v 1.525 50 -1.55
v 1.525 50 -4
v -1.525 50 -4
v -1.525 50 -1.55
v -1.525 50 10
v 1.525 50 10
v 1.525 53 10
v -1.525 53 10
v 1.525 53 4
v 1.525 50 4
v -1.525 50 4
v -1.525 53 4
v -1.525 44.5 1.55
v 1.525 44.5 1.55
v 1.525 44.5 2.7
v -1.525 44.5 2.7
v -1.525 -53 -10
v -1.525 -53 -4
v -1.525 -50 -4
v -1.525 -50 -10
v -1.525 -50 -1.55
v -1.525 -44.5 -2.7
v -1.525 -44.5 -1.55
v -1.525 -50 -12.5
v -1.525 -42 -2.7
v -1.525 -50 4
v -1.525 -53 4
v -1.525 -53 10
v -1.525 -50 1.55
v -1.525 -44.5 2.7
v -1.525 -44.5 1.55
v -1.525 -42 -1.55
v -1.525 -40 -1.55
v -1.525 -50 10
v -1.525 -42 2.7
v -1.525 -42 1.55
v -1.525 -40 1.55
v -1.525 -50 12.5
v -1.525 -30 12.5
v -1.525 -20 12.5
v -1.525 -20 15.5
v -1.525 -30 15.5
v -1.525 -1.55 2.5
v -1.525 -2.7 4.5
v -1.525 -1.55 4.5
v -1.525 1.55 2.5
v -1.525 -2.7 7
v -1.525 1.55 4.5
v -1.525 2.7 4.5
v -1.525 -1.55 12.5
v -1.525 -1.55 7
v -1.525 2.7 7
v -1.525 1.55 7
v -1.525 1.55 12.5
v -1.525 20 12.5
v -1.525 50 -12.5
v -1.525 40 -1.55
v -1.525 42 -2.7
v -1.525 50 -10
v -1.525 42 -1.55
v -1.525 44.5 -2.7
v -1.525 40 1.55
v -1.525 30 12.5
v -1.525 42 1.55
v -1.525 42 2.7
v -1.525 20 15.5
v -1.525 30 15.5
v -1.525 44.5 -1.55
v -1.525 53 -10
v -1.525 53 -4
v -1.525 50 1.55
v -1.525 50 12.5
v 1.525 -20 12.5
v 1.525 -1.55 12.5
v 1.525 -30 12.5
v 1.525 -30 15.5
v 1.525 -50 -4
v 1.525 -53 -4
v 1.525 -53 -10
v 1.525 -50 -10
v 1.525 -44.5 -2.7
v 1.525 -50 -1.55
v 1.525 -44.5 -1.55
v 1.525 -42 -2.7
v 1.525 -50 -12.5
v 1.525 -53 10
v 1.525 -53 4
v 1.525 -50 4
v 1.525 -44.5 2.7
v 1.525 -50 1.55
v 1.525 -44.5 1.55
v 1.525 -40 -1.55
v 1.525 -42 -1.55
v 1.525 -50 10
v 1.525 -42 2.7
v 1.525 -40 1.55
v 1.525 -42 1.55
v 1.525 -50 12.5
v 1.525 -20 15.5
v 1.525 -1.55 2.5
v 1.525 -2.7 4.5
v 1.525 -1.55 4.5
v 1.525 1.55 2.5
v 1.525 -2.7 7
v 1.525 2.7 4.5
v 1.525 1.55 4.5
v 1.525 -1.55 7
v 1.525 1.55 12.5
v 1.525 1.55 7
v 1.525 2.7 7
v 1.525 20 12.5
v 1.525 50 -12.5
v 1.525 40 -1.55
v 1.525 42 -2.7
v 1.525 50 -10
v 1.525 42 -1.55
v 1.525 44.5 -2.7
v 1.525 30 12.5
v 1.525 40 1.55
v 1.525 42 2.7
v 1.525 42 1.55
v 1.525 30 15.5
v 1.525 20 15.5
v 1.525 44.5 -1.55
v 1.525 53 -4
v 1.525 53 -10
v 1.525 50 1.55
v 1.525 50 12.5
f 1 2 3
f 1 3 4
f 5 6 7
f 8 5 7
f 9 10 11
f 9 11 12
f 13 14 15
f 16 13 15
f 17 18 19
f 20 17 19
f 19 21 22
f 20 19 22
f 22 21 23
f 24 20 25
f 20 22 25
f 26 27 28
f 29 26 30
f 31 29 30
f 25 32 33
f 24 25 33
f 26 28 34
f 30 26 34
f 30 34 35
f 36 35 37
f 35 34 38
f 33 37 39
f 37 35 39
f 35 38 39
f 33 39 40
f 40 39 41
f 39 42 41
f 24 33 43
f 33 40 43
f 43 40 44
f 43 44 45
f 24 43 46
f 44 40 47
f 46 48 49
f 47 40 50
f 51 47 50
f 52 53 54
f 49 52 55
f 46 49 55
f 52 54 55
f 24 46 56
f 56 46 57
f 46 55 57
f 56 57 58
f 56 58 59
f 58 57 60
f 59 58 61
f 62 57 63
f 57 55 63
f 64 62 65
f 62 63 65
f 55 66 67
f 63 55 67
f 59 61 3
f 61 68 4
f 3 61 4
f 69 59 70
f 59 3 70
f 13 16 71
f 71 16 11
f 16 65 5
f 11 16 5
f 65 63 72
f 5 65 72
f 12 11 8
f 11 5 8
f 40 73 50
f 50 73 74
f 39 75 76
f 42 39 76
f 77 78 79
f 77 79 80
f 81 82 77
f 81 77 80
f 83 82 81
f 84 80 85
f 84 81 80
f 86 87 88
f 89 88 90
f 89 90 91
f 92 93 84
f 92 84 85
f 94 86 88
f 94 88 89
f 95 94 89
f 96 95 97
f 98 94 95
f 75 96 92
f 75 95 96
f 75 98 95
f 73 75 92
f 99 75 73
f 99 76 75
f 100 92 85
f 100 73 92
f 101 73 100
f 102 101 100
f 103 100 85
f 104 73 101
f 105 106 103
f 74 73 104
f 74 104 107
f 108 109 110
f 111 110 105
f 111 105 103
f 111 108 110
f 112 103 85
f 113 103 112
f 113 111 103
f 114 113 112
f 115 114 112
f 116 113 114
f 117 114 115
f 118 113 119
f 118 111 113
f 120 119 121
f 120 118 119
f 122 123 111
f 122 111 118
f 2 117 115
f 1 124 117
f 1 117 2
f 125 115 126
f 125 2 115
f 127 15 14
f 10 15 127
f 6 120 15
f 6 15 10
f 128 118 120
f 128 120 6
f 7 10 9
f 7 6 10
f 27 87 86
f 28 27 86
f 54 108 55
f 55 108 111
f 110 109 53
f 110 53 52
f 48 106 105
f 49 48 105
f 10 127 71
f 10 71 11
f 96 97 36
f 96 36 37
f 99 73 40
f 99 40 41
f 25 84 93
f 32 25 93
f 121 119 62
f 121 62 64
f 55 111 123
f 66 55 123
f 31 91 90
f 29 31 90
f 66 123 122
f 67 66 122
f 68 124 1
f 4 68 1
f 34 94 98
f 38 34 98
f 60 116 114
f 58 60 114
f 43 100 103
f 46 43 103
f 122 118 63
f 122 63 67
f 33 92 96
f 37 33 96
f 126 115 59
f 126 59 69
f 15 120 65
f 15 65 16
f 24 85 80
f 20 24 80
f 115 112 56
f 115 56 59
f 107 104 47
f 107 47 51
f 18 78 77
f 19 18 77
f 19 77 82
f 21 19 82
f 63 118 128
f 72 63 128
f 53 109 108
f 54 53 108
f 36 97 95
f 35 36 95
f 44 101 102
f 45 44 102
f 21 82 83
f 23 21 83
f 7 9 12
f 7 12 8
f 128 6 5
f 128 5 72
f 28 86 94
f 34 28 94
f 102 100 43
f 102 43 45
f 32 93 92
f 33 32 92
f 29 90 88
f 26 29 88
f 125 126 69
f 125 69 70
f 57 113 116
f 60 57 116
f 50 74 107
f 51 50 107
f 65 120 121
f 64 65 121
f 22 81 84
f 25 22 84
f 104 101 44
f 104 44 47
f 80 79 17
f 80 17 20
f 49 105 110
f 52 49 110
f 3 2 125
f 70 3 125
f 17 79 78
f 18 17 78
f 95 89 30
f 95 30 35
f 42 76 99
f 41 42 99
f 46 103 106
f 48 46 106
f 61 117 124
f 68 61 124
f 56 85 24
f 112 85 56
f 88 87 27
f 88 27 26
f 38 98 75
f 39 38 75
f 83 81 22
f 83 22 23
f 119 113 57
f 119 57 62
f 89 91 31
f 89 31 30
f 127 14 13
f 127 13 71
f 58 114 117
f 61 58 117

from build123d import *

# Parameters (mm, degrees)
F0_W     = 100
F0_H     = 25
F1_DEPTH = 1.525
F2_W     = 3
F2_H     = 6
F3_DEPTH = 3.05
F4_W     = 3.1
F4_H     = 5.5
F4_H_2   = 2.5
F4_W_2   = 1.15
F4_H_3   = 2
F4_W_3   = 5.5
F4_H_4   = 3.1
F4_W_4   = 2.5
F4_H_5   = 1.15
F4_W_5   = 2
F5_DEPTH = 3.05
F6_W     = 10
F6_H     = 3
F7_DEPTH = 3.05


with BuildPart() as f1:
    # F0 (on Right) → F1 (new body, symmetric)
    with BuildSketch(Plane.YZ):
        Rectangle(F0_W, F0_H)
    extrude(amount=F1_DEPTH, both=True)

    # F2 (on face) → F3 (join, through all)
    with BuildSketch(Plane.YZ.offset(1.525)):
        with Locations((-51.5, 7)):
            Rectangle(F2_W, F2_H)
        with Locations((-51.5, -7)):
            Rectangle(F2_W, F2_H)
        with Locations((51.5, -7)):
            Rectangle(F2_W, F2_H)
        with Locations((51.5, 7)):
            Rectangle(F2_W, F2_H)
    extrude(amount=-F3_DEPTH)

    # F4 (on face) → F5 (cut, through all)
    with BuildSketch(Plane.YZ.offset(1.525)):
        with Locations((0, 9.75)):
            Rectangle(F4_W, F4_H)
        with Locations((0, 5.75)):
            Rectangle(F4_W, F4_H_2)
        with Locations((-2.125, 5.75)):
            Rectangle(F4_W_2, F4_H_2)
        with Locations((2.125, 5.75)):
            Rectangle(F4_W_2, F4_H_2)
        with Locations((0, 3.5)):
            Rectangle(F4_W, F4_H_3)
        with Locations((-47.25, 0)):
            Rectangle(F4_W_3, F4_H_4)
        with Locations((-43.25, 0)):
            Rectangle(F4_W_4, F4_H_4)
        with Locations((-43.25, -2.125)):
            Rectangle(F4_W_4, F4_H_5)
        with Locations((-43.25, 2.125)):
            Rectangle(F4_W_4, F4_H_5)
        with Locations((-41, 0)):
            Rectangle(F4_W_5, F4_H_4)
        with Locations((43.25, 2.125)):
            Rectangle(F4_W_4, F4_H_5)
        with Locations((47.25, 0)):
            Rectangle(F4_W_3, F4_H_4)
        with Locations((43.25, 0)):
            Rectangle(F4_W_4, F4_H_4)
        with Locations((43.25, -2.125)):
            Rectangle(F4_W_4, F4_H_5)
        with Locations((41, 0)):
            Rectangle(F4_W_5, F4_H_4)
    extrude(amount=-F5_DEPTH, mode=Mode.SUBTRACT)

    # F6 (on face) → F7 (join, through all)
    with BuildSketch(Plane.YZ.offset(1.525)):
        with Locations((-25, 14)):
            Rectangle(F6_W, F6_H)
        with Locations((25, 14)):
            Rectangle(F6_W, F6_H)
    extrude(amount=-F7_DEPTH)


solid = f1.part
